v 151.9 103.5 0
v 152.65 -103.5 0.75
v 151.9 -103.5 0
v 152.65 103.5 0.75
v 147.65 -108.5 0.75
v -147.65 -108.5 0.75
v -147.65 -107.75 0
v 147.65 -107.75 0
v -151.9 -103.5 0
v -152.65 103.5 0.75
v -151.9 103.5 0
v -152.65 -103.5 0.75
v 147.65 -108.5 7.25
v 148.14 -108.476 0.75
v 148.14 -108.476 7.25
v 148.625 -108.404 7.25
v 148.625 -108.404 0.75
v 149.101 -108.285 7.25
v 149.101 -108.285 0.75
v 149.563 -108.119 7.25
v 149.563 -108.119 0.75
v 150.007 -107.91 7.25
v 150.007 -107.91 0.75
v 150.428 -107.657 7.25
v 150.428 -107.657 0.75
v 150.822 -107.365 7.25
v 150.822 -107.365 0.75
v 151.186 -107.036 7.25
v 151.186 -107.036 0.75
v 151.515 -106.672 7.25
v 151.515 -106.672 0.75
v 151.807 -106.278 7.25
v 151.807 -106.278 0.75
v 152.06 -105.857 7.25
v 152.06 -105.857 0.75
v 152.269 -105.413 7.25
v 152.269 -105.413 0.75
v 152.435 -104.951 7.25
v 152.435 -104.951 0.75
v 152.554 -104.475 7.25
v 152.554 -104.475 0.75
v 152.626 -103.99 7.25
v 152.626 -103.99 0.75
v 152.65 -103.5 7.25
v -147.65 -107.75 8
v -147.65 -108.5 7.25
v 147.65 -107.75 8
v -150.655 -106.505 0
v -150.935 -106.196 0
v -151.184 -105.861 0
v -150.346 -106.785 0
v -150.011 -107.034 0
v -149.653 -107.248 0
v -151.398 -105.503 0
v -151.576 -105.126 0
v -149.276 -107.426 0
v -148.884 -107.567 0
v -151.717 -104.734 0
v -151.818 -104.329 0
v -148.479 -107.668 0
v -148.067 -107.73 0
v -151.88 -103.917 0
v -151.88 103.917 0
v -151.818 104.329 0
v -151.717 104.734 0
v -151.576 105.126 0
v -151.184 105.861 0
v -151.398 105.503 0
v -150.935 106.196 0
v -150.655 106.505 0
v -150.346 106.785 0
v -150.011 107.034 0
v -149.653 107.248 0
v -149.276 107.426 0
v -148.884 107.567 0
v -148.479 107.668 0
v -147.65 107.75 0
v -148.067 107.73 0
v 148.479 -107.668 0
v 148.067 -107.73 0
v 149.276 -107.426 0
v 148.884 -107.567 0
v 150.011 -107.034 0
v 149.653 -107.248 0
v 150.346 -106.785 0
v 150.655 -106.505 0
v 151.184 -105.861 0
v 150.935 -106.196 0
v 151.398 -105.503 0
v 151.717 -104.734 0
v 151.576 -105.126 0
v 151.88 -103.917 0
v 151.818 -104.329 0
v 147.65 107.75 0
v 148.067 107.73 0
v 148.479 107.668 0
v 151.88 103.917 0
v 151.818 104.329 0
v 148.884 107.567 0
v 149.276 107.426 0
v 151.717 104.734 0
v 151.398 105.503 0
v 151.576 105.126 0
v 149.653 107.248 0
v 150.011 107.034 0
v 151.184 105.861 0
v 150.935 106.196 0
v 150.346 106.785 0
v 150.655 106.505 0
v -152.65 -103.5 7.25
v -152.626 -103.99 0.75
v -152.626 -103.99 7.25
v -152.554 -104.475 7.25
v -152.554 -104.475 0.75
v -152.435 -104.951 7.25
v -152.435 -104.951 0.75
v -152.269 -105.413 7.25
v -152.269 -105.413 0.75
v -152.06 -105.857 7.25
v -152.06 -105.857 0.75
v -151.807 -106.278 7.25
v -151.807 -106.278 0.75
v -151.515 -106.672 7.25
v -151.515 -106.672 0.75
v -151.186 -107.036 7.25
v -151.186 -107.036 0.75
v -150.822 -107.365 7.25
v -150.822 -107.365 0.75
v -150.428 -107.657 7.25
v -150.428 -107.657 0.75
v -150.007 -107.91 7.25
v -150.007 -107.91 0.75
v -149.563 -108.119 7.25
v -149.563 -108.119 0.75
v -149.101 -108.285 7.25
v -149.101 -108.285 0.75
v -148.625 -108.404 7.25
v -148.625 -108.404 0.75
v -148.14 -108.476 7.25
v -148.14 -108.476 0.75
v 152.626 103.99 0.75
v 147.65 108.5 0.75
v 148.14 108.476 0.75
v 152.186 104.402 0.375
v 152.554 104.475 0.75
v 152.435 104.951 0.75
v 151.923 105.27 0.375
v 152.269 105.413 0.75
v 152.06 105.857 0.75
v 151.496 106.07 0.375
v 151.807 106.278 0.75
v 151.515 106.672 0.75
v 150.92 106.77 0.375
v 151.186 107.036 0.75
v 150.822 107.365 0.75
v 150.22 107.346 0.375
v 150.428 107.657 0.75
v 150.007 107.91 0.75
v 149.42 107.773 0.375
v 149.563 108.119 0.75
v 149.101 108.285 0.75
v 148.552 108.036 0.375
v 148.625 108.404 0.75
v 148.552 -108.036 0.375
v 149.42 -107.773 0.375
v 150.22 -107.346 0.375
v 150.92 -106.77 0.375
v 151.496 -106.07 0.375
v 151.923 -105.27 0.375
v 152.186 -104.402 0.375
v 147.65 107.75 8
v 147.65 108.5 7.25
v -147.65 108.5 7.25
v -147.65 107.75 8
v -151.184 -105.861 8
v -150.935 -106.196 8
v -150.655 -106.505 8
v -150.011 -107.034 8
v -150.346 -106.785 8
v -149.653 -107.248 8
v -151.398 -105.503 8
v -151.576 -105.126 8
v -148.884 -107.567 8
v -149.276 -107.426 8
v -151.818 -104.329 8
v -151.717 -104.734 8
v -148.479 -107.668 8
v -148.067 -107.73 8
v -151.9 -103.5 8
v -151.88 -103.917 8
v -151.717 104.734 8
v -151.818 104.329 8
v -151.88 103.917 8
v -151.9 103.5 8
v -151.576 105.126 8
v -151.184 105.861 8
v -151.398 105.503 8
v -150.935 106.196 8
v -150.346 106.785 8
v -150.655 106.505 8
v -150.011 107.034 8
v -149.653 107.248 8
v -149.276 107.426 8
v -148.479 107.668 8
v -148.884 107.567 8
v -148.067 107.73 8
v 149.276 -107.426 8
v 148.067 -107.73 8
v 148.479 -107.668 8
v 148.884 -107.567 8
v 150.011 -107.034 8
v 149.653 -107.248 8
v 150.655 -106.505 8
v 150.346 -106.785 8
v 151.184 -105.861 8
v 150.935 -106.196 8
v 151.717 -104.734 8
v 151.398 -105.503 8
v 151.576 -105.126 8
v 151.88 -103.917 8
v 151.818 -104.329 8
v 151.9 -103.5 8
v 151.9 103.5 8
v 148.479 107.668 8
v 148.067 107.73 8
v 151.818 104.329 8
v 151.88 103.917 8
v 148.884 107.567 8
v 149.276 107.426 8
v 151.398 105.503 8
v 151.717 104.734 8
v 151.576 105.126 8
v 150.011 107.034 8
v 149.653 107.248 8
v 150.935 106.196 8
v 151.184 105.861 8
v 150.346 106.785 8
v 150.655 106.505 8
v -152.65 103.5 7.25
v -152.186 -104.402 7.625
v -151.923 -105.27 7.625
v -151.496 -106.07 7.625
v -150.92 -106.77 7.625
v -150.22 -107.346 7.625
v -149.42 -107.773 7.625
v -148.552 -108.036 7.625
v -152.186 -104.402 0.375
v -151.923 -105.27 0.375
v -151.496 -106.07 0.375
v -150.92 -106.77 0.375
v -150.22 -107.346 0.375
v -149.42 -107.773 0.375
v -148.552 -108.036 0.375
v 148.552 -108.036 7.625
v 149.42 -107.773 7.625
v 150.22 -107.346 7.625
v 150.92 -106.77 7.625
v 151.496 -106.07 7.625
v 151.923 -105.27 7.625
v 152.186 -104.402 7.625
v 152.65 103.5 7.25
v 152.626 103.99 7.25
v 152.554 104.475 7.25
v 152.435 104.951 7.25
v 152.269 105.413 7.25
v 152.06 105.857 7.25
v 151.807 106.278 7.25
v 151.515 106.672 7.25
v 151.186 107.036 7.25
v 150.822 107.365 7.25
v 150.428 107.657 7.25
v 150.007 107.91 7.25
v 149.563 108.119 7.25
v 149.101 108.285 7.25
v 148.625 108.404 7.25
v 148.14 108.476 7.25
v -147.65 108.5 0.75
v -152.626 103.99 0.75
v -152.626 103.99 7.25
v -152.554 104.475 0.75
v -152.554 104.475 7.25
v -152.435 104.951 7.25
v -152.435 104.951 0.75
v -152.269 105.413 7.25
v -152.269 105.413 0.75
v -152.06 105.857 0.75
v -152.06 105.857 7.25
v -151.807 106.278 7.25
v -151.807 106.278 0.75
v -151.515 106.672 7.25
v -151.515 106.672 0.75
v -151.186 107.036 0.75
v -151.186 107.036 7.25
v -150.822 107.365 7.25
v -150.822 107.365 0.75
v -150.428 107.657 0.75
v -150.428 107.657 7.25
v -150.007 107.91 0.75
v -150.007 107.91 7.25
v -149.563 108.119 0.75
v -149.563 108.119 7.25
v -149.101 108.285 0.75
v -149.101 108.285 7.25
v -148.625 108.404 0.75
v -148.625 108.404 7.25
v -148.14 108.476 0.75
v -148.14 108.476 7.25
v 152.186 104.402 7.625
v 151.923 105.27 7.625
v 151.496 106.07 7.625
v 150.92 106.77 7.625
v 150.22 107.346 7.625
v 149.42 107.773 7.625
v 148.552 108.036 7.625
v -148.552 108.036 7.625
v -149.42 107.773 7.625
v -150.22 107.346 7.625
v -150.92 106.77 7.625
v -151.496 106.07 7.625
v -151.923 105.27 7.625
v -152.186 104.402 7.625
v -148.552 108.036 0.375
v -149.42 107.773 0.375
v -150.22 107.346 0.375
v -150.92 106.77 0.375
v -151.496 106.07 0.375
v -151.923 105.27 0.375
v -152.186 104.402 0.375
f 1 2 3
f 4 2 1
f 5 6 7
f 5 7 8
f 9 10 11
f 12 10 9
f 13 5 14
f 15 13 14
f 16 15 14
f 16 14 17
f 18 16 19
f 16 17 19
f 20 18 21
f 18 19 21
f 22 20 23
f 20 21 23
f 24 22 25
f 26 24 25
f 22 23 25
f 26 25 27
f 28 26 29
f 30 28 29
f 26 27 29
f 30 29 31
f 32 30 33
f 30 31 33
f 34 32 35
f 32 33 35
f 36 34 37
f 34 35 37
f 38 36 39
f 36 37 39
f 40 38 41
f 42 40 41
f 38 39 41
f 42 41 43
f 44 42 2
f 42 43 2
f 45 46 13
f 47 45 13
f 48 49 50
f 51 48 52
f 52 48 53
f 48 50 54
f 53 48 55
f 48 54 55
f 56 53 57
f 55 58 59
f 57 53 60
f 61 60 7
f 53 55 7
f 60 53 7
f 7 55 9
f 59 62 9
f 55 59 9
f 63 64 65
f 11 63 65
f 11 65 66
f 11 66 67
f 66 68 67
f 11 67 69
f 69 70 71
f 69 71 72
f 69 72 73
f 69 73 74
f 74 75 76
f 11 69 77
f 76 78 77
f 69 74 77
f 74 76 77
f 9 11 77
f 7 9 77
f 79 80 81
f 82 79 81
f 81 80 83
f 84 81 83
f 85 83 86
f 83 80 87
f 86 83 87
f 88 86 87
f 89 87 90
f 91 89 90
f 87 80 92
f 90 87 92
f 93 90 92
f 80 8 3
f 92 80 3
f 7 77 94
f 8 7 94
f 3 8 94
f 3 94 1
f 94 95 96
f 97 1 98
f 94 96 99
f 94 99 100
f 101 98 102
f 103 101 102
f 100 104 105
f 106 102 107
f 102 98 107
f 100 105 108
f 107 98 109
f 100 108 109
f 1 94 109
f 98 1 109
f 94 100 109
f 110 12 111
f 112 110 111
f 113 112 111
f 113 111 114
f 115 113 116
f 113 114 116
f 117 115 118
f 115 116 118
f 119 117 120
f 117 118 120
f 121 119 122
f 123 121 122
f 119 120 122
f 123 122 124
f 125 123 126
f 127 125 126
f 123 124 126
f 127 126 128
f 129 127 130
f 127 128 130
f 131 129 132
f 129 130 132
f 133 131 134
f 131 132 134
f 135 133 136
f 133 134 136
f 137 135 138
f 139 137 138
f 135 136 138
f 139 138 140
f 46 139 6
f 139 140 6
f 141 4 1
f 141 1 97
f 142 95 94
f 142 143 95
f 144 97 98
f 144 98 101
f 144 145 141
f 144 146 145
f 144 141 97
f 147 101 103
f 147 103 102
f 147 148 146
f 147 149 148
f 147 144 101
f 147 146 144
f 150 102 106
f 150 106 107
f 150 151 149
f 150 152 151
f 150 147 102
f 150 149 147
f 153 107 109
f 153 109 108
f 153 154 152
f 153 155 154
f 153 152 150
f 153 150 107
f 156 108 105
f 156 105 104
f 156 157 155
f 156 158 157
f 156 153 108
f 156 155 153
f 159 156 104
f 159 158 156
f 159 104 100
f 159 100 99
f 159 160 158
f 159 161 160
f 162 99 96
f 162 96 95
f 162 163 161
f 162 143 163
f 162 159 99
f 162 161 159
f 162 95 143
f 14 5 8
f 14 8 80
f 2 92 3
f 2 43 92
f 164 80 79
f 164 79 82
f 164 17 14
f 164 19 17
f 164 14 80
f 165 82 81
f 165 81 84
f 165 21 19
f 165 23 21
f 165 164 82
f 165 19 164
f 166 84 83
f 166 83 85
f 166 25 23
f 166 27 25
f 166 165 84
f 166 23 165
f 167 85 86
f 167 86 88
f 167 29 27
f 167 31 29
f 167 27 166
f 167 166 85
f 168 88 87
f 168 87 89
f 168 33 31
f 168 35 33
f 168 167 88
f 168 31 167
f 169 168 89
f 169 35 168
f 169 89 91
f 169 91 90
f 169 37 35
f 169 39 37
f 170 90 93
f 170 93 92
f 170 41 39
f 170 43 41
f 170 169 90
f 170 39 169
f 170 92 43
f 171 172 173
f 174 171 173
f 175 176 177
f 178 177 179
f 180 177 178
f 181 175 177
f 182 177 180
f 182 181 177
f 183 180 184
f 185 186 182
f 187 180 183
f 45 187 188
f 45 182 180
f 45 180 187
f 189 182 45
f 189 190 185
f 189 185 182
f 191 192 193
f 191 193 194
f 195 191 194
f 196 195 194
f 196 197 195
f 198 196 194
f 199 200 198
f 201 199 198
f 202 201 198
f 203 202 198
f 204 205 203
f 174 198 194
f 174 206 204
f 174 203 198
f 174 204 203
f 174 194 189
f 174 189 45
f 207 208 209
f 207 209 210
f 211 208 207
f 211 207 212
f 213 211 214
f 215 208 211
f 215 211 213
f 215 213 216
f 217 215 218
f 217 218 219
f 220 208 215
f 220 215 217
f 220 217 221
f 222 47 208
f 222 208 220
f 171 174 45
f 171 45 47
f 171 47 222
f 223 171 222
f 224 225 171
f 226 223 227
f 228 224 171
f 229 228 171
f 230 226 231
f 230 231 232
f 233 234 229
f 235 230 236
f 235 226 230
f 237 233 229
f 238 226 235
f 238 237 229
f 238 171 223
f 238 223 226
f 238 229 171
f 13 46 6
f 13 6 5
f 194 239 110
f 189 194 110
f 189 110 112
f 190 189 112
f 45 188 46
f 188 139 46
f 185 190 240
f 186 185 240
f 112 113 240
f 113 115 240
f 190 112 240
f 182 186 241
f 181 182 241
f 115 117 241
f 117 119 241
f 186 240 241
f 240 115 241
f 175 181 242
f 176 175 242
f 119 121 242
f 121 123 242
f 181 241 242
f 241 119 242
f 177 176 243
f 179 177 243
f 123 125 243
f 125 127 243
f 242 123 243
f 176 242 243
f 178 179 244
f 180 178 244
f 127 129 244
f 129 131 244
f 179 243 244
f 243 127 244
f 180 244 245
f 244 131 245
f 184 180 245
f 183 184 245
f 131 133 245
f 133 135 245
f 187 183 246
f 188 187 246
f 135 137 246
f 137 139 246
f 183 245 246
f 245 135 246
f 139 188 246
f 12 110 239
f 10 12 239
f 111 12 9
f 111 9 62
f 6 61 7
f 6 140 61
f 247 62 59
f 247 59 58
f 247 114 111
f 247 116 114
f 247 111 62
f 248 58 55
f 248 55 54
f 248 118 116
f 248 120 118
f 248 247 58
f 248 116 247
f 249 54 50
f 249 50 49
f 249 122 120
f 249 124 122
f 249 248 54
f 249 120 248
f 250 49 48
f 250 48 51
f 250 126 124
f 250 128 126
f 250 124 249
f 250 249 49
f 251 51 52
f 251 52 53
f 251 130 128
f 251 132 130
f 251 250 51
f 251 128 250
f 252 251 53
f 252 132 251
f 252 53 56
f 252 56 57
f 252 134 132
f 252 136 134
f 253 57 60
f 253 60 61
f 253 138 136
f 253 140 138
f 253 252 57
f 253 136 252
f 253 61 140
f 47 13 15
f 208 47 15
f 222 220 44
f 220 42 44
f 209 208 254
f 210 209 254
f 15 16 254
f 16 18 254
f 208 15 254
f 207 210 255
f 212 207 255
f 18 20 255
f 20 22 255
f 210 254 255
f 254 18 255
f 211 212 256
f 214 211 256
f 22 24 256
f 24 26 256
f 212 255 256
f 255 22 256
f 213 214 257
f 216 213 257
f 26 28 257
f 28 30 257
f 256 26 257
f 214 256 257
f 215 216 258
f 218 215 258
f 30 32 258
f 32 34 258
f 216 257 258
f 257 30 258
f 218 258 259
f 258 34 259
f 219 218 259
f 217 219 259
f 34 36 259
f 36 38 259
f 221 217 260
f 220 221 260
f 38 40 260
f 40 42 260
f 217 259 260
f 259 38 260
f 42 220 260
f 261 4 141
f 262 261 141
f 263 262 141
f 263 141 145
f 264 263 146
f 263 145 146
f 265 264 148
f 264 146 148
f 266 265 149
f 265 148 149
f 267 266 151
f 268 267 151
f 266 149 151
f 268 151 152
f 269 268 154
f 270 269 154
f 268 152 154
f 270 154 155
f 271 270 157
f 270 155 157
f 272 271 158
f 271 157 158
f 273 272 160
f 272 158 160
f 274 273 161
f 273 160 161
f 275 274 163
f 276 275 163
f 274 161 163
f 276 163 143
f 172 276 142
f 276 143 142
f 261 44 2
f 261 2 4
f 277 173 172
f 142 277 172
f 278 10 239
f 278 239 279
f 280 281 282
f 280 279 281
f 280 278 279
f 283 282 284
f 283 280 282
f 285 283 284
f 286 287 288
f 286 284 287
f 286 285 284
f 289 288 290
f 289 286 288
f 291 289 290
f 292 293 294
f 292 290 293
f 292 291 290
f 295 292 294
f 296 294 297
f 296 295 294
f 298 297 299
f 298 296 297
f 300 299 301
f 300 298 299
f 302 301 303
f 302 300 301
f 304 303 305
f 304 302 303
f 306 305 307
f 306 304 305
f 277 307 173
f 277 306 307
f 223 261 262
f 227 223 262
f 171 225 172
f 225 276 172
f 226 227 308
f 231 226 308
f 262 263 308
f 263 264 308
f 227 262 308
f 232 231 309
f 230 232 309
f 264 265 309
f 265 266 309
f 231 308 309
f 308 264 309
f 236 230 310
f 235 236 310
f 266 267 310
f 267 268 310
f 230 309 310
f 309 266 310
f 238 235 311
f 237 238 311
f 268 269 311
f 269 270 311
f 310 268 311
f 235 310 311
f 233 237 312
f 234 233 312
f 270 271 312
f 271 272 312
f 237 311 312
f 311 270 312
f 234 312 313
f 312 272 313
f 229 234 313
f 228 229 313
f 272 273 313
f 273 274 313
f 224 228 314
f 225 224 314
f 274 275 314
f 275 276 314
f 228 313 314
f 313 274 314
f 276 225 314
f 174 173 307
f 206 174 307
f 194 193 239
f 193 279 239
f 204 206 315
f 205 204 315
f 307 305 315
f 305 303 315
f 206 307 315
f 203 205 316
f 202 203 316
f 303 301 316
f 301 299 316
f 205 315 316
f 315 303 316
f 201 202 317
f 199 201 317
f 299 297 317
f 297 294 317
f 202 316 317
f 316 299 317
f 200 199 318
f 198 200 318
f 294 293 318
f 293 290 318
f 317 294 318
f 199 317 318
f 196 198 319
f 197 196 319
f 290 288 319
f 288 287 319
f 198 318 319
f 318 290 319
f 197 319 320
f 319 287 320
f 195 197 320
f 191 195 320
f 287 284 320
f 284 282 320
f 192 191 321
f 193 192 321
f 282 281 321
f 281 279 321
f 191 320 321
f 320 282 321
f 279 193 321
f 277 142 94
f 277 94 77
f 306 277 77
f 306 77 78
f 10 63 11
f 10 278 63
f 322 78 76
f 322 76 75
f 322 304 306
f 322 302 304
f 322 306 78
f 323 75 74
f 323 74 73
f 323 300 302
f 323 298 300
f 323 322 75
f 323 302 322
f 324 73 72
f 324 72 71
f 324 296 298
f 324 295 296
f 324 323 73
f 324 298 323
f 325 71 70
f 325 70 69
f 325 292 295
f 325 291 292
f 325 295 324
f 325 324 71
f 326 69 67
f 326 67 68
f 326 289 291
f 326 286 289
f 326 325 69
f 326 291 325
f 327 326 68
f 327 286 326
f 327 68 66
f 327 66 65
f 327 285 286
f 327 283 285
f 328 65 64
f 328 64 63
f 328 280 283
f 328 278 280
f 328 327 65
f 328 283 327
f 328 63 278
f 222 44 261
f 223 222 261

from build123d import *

# Parameters (mm, degrees)
SKETCH1_W           = 305.3
SKETCH1_H           = 217
BOSS_EXTRUDE1_DEPTH = 8
FILLET1_R           = 5
CHAMFER1_SIZE       = 0.75


with BuildPart() as part:
    # Sketch1 → Boss-Extrude1 (new body)
    with BuildSketch(Plane.XY.offset(8)):
        Rectangle(SKETCH1_W, SKETCH1_H)
    extrude(amount=-BOSS_EXTRUDE1_DEPTH)

    # Fillet1
    fillet1_edges = [part.edges().sort_by_distance(p)[0] for p in [
        (-152.65, 108.5, 4),
        (152.65, 108.5, 4),
        (152.65, -108.5, 4),
        (-152.65, -108.5, 4),
    ]]
    fillet(fillet1_edges, radius=FILLET1_R)

    # Chamfer1
    chamfer1_edges = [part.edges().sort_by_distance(p)[0] for p in [
        (152.65, 0, 8),
        (152.65, 0, 0),
        (-152.65, 0, 8),
        (0, -108.5, 8),
        (0, 108.5, 8),
        (-151.185533906, -107.035533906, 8),
        (-151.185533906, 107.035533906, 8),
        (151.185533906, -107.035533906, 8),
        (151.185533906, 107.035533906, 8),
        (0, 108.5, 0),
        (-152.65, 0, 0),
        (0, -108.5, 0),
        (-151.185533906, -107.035533906, 0),
        (-151.185533906, 107.035533906, 0),
        (151.185533906, -107.035533906, 0),
        (151.185533906, 107.035533906, 0),
    ]]
    chamfer(chamfer1_edges, length=CHAMFER1_SIZE)


solid = part.part
